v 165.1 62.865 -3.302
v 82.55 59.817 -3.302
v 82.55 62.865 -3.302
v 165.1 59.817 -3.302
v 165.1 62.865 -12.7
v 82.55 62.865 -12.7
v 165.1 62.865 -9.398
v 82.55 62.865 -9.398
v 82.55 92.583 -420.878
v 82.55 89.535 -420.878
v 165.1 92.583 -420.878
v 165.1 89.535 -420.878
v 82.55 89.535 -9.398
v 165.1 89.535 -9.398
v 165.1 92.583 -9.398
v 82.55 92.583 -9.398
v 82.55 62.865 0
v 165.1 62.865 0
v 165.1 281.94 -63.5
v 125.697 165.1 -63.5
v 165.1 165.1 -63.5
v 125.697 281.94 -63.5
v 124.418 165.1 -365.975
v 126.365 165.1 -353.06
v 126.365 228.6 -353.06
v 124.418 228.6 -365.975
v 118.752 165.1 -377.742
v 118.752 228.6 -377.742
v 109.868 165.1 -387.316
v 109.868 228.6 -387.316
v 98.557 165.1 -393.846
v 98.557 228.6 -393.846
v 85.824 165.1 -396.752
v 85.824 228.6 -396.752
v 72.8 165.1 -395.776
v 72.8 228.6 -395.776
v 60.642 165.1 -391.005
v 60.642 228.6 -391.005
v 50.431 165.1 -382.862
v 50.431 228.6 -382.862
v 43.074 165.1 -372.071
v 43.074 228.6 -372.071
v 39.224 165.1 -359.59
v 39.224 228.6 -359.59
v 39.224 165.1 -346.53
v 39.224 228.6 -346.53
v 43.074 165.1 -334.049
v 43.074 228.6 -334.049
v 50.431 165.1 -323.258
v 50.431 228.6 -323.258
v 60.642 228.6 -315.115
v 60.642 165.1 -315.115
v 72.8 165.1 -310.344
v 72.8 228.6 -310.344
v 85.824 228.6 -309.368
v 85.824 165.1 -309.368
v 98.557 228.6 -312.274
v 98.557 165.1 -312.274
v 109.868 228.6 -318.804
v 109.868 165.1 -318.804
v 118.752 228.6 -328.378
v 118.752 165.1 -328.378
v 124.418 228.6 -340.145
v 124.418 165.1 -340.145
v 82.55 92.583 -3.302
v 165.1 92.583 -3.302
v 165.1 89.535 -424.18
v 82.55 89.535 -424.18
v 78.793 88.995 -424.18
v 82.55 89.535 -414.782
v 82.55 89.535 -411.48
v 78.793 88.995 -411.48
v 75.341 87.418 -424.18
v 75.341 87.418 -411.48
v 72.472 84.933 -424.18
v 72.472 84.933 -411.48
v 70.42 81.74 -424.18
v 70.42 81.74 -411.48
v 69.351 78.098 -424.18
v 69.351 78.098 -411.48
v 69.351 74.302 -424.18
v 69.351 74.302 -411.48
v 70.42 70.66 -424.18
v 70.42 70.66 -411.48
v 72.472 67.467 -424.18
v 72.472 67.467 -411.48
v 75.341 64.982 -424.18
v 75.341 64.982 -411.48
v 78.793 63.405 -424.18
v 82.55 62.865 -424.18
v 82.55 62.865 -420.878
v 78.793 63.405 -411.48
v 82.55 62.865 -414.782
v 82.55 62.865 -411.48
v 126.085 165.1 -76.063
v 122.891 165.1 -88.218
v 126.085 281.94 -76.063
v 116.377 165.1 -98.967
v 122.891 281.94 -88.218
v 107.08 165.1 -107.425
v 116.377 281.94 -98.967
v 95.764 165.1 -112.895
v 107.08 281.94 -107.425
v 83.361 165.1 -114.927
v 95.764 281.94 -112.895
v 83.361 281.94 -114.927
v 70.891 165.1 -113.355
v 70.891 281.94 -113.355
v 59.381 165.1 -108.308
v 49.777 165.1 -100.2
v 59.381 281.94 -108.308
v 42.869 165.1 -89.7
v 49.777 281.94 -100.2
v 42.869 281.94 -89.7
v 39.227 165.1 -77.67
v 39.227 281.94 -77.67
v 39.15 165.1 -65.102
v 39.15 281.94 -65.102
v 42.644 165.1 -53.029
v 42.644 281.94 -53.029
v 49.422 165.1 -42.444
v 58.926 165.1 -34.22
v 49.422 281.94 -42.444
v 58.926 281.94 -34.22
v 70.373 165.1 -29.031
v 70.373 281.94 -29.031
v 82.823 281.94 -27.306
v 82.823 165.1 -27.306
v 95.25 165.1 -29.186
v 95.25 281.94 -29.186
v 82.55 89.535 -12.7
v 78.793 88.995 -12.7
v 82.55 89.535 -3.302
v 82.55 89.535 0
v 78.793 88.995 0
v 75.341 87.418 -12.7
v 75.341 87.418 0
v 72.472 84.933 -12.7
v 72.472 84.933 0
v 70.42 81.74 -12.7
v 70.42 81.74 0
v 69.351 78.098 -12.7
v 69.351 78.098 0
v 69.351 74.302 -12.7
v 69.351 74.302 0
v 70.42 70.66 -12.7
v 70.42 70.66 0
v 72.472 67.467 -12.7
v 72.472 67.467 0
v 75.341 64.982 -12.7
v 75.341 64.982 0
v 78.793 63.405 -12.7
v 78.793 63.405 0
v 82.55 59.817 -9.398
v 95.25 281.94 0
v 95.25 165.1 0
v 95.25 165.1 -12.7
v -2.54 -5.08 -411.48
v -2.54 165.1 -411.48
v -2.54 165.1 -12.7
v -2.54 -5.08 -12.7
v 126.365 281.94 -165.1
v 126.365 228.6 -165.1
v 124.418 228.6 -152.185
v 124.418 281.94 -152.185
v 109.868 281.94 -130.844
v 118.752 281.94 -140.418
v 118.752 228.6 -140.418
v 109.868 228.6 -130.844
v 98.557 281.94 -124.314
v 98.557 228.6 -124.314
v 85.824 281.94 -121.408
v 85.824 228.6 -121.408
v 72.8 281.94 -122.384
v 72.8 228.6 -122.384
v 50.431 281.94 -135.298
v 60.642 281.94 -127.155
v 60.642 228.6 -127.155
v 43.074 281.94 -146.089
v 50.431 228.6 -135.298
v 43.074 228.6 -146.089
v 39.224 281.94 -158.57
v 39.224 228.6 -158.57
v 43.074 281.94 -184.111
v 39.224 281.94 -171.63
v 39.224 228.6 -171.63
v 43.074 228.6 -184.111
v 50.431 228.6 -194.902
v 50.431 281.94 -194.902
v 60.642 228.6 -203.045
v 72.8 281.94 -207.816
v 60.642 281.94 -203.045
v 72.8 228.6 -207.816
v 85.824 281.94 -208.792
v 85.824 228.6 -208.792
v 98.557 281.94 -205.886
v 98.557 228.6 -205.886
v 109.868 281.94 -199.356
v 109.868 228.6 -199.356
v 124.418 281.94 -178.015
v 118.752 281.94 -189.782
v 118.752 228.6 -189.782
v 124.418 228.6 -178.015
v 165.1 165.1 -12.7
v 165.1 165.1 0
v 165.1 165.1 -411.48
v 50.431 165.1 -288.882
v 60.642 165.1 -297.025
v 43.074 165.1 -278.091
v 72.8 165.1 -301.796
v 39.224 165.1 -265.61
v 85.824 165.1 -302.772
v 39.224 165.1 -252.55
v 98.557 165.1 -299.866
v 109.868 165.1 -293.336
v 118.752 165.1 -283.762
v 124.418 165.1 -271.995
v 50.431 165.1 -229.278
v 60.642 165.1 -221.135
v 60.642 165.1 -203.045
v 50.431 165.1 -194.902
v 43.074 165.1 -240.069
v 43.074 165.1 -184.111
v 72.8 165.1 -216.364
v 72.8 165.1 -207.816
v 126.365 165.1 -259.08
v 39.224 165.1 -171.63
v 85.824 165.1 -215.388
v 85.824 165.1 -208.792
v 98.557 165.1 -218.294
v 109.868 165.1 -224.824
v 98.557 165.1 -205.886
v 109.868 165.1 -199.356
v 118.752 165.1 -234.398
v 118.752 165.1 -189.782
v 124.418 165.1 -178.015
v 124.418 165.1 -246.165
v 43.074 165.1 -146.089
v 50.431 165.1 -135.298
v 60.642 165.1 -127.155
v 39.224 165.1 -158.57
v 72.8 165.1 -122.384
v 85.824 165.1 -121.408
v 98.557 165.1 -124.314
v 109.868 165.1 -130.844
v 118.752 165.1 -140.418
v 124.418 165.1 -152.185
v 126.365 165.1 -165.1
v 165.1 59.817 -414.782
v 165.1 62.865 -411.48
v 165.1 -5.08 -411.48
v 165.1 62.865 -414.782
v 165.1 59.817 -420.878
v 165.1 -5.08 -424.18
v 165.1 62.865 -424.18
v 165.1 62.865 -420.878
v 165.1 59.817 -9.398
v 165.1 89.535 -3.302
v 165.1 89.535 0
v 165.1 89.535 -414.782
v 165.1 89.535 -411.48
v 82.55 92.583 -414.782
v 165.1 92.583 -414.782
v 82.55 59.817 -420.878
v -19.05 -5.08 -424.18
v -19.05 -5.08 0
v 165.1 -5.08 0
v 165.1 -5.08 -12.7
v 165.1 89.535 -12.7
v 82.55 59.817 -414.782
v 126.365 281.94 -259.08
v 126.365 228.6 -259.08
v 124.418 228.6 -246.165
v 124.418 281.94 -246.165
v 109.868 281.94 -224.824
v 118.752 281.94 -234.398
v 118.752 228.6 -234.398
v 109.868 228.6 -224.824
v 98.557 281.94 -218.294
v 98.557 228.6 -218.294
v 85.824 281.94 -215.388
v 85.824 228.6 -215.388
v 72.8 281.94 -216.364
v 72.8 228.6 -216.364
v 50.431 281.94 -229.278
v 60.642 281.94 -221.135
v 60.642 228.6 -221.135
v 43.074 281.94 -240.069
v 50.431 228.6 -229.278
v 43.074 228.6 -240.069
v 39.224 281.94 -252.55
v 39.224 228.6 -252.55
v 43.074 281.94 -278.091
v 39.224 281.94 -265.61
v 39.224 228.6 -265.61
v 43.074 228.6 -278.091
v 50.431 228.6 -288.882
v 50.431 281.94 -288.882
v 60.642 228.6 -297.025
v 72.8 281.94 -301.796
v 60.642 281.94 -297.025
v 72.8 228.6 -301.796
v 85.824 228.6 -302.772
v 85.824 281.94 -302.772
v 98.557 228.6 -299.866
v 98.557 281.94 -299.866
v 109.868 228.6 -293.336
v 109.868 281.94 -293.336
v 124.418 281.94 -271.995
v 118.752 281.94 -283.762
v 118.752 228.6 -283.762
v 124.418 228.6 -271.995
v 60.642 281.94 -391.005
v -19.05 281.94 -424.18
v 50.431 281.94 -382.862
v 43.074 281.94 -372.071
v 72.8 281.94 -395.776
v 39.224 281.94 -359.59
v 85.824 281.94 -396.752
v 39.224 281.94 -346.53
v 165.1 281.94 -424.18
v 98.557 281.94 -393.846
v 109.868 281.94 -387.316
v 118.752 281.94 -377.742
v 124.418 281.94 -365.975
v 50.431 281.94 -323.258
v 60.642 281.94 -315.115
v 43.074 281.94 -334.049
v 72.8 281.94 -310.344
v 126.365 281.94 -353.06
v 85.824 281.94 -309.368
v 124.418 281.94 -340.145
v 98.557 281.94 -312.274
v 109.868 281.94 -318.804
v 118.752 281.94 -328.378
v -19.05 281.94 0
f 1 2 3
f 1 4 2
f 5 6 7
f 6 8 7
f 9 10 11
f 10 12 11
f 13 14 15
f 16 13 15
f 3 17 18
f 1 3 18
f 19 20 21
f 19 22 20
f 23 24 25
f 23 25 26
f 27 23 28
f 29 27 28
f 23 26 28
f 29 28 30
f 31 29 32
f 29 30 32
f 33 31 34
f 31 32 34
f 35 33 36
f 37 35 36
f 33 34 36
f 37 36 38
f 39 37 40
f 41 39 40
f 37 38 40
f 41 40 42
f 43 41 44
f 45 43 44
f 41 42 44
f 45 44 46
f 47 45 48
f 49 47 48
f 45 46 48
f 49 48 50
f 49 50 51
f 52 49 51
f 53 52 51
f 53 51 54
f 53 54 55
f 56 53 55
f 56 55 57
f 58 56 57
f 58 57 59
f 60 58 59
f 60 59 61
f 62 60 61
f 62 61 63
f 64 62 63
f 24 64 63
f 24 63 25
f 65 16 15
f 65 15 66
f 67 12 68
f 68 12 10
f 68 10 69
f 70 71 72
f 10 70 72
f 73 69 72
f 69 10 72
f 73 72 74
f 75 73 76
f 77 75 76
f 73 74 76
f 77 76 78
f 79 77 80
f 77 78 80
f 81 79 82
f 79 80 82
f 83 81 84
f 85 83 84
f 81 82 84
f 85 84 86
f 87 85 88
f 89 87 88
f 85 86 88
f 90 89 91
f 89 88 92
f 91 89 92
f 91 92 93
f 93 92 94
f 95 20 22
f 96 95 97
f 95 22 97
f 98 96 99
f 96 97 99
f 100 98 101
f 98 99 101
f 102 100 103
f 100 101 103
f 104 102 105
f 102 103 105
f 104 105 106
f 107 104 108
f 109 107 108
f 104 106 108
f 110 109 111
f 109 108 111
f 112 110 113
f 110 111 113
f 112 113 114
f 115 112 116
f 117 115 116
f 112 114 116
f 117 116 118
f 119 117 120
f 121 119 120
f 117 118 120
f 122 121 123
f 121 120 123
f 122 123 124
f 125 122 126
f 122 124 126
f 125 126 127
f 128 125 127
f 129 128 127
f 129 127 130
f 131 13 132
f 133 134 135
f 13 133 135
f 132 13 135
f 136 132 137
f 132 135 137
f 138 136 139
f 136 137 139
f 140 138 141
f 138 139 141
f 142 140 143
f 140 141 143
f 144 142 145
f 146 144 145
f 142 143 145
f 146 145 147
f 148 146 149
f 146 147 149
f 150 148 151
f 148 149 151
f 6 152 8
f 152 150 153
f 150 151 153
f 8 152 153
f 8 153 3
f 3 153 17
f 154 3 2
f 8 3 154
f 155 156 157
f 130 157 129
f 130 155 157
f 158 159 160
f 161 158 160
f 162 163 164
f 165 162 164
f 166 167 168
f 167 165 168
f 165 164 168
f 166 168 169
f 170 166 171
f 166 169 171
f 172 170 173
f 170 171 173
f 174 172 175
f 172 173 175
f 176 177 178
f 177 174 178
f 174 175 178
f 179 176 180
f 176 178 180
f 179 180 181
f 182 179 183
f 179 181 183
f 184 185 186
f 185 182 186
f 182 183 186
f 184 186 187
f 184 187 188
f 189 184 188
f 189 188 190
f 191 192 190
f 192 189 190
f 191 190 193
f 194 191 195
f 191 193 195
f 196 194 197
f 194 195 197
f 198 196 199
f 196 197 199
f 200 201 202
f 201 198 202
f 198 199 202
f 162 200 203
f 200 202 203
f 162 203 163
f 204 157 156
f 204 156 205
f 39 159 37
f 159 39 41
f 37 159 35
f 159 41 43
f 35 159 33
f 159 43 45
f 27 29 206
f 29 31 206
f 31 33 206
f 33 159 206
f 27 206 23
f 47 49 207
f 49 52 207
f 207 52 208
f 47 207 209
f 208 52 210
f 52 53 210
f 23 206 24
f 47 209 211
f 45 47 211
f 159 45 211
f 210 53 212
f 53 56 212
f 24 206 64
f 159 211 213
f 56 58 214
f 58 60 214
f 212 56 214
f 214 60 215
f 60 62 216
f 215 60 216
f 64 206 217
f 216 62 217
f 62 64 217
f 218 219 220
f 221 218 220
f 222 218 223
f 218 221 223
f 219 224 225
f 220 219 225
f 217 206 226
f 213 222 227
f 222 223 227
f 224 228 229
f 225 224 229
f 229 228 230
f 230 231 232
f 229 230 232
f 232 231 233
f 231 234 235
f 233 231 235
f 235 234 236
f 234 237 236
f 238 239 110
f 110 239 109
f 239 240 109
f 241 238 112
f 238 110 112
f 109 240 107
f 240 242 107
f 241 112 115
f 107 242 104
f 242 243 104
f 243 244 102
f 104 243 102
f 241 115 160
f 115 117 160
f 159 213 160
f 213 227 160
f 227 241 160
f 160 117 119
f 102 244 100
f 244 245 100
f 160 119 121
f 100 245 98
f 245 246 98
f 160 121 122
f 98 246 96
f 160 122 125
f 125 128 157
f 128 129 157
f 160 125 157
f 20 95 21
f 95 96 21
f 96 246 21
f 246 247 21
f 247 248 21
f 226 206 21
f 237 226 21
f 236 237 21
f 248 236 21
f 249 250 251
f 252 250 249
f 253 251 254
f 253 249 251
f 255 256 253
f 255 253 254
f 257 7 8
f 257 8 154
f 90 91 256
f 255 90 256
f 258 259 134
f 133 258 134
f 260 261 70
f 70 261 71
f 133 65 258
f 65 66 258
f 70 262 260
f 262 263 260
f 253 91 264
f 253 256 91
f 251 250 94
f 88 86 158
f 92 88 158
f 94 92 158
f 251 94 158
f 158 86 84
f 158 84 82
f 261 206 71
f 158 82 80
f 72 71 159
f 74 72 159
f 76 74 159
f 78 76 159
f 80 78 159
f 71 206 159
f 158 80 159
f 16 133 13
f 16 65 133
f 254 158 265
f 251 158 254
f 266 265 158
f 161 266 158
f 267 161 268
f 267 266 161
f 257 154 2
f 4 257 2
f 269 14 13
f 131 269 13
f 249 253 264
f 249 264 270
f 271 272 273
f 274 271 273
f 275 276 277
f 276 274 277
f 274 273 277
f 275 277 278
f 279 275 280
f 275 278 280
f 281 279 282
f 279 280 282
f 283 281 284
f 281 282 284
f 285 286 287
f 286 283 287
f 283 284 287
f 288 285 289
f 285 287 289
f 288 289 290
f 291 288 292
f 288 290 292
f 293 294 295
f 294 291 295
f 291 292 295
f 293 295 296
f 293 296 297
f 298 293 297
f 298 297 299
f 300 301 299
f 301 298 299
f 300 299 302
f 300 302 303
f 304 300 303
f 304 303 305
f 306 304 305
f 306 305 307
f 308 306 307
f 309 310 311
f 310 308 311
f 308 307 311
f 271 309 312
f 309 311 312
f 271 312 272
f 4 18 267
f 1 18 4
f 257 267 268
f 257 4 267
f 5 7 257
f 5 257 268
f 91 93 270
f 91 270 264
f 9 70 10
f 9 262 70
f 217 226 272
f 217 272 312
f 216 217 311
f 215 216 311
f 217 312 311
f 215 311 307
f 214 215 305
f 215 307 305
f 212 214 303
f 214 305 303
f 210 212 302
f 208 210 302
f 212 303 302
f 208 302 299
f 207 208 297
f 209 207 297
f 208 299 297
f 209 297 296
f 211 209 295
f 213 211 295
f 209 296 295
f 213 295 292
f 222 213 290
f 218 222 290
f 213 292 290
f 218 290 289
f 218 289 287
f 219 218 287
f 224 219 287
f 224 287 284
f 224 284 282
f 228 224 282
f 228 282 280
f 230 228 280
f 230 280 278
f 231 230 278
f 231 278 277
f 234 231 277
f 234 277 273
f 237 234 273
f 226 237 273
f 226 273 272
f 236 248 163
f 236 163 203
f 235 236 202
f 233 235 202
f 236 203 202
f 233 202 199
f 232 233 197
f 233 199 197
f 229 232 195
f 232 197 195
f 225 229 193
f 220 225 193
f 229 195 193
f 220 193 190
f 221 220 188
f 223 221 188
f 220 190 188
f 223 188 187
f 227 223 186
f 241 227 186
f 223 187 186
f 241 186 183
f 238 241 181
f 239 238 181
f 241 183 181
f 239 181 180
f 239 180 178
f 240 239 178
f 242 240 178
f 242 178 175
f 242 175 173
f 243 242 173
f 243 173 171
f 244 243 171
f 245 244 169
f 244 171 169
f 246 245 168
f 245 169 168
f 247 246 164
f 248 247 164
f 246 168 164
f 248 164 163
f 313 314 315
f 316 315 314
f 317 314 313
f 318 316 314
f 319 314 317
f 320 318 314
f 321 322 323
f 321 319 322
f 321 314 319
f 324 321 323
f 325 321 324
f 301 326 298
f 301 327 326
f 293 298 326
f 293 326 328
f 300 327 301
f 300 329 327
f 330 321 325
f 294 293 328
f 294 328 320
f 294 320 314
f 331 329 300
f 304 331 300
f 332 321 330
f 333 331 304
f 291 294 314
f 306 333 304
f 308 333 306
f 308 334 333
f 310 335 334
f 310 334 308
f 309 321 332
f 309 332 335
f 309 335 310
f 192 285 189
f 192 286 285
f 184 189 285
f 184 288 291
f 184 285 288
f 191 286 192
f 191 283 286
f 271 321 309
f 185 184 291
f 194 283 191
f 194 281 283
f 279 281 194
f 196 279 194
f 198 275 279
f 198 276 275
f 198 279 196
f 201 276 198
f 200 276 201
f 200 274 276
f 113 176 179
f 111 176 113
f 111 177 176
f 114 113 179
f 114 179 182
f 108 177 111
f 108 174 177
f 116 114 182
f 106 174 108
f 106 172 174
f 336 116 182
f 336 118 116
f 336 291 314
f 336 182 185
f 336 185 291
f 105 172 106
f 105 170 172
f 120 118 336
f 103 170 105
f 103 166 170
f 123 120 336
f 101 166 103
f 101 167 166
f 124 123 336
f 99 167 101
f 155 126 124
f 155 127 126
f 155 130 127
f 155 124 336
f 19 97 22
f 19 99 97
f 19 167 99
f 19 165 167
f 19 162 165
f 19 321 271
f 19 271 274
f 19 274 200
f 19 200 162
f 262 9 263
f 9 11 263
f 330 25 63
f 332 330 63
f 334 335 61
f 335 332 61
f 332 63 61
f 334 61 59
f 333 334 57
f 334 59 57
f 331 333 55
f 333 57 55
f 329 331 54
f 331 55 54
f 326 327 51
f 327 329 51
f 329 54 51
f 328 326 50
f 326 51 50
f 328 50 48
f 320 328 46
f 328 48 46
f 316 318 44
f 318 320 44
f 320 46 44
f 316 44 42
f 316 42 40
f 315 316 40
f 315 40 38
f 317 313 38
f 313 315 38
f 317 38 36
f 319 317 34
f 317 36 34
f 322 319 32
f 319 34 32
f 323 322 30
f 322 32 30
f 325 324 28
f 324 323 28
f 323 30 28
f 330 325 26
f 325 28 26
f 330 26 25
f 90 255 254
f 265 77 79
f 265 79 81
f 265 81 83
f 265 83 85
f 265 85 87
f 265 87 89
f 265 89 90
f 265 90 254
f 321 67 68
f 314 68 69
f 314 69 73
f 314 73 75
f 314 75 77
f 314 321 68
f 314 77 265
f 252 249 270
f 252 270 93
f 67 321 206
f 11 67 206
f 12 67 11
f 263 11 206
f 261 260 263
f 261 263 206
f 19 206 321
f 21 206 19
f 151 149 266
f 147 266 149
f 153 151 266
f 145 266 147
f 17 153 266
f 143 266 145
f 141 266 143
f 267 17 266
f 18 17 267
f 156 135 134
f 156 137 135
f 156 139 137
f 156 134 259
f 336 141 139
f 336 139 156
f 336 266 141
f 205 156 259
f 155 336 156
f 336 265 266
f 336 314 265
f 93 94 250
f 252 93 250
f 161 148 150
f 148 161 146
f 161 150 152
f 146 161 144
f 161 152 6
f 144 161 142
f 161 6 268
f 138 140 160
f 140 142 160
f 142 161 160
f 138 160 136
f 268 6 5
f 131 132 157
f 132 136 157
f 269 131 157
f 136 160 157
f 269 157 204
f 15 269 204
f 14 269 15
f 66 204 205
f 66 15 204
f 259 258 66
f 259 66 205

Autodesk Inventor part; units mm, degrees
ref_plane "YZ Plane" through (0, 0, 0) normal (1, 0, 0) x (0, 1, 0)
ref_plane "XZ Plane" through (0, 0, 0) normal (0, 1, 0) x (-1, 0, 0)
sketch "Sketch1" plane through (0, 0, 0) normal (1, 0, 0) x (0, 1, 0)
  line L0 (0, 0) -> (228.6, 0)
  line L1 (228.6, 0) -> (228.6, -424.18)
  line L2 (228.6, -424.18) -> (0, -424.18)
  line L3 (0, -424.18) -> (0, 0)
  point P0 (0, 0)
  dimension "d0" = 424.18
  dimension "d1" = 228.6
extrude "Extrusion1" add sketch "Sketch1" along normal blind 165.1
sketch "Sketch2" plane through (165.1, 0, 0) normal (1, 0, 0) x (0, 0, -1)
  line L0 (0, 0) -> (424.18, 0) construction
  line L1 (12.7, 0) -> (411.48, 0)
  line L2 (411.48, 0) -> (411.48, 165.1)
  line L3 (411.48, 165.1) -> (12.7, 165.1)
  line L4 (12.7, 165.1) -> (12.7, 0)
  line L5 (0, 228.6) -> (0, 0) construction
  line L6 (424.18, 0) -> (424.18, 228.6) construction
  dimension "d4" = 398.78
  dimension "d5" = 165.1
  dimension "d6" = 12.7
  dimension "d7" = 12.7
extrude "Extrusion2" cut sketch "Sketch2" against normal blind 148.59
sketch "Sketch3" plane through (0, 0, 0) normal (0, 0, 1) x (1, 0, 0)
  line L0 (165.1, 228.6) -> (165.1, 0) projected
  line L1 (165.1, 89.535) -> (82.55, 89.535)
  line L2 (69.215, 89.535) -> (69.215, 62.865) construction
  line L3 (82.55, 62.865) -> (165.1, 62.865)
  line L4 (165.1, 62.865) -> (165.1, 89.535)
  line L5 (0, 0) -> (165.1, 0) projected
  arc A0 (82.55, 89.535) -> (82.55, 62.865) centre (82.55, 76.2) ccw
  dimension "d10" = 95.885
  dimension "d11" = 26.67
  dimension "d12" = 62.865
extrude "Extrusion3" cut sketch "Sketch3" against normal blind 457.2
sketch "Sketch4" plane through (0, 228.6, 0) normal (0, 1, 0) x (1, 0, 0)
  line L0 (165.1, 12.7) -> (165.1, 411.48) construction
  line L1 (165.1, 12.7) -> (16.51, 12.7) construction
  line L2 (16.51, 12.7) -> (16.51, 411.48) construction
  line L3 (165.1, 411.48) -> (16.51, 411.48) construction
  line L4 (0, 424.18) -> (165.1, 424.18) construction
  line L5 (0, 424.18) -> (165.1, 424.18) construction
  circle A0 centre (82.55, 353.06) radius 43.815
  line L6 (0, 0) -> (0, 424.18) construction
  circle A1 centre (82.55, 259.08) radius 43.815
  line L7 (0, 212.09) -> (165.1, 212.09) construction
  line L8 (165.1, 424.18) -> (165.1, 0) construction
  circle A2 centre (82.55, 71.12) radius 43.815
  circle A3 centre (82.55, 165.1) radius 43.815
  dimension "d15" = 87.63
  dimension "d16" = 82.55
  dimension "d17" = 58.42
  dimension "d18" = 87.63
  dimension "d19" = 93.98
  dimension "d20" = 82.55
extrude "Extrusion4" cut sketch "Sketch4" against normal blind 76.2
sketch "Sketch5" plane through (0, 228.6, 0) normal (0, 1, 0) x (1, 0, 0)
  circle A0 centre (82.55, 165.1) radius 43.815 projected
  circle A1 centre (82.55, 353.06) radius 43.815 projected
  circle A2 centre (82.55, 259.08) radius 43.815 projected
  circle A3 centre (82.55, 71.12) radius 43.815 projected
  line L0 (0, 0) -> (0, 424.18) projected
  line L1 (0, 0) -> (165.1, 0) projected
  line L2 (165.1, 424.18) -> (165.1, 0) projected
  line L3 (0, 424.18) -> (165.1, 424.18) projected
  point P0 (0, 0)
extrude "Extrusion5" add sketch "Sketch5" along normal blind 53.34
sketch "Sketch7" plane through (0, 0, 0) normal (-1, 0, 0) x (0, 0, 1)
  line L0 (0, 0) -> (0, 281.94) projected
  line L1 (-424.18, 281.94) -> (0, 281.94) projected
  line L2 (-424.18, 281.94) -> (-424.18, 0) projected
  line L3 (-424.18, 0) -> (0, 0) projected
  point P0 (0, 0)
extrude "Extrusion6" add sketch "Sketch7" along normal blind 19.05
sketch "Sketch8" plane through (16.51, 0, 0) normal (1, 0, 0) x (0, 0, -1)
  line L0 (411.48, 0) -> (12.7, 0) projected
  line L1 (411.48, 165.1) -> (411.48, 0) projected
  line L2 (12.7, 165.1) -> (411.48, 165.1) projected
  line L3 (12.7, 0) -> (12.7, 165.1) projected
  point P0 (0, 0)
extrude "Extrusion7" cut sketch "Sketch8" against normal blind 19.05
sketch "Sketch12" plane through (165.1, 0, 0) normal (1, 0, 0) x (0, 0, -1)
  line L0 (0, 89.535) -> (12.7, 89.535) construction
  line L1 (3.302, 89.535) -> (9.398, 89.535)
  line L2 (9.398, 89.535) -> (9.398, 92.583)
  line L3 (9.398, 92.583) -> (3.302, 92.583)
  line L4 (3.302, 92.583) -> (3.302, 89.535)
  line L5 (0, 89.535) -> (0, 281.94) construction
  line L6 (12.7, 89.535) -> (12.7, 62.865) construction
  line L7 (0, 89.535) -> (12.7, 89.535) construction
  line L8 (0, 62.865) -> (0, 89.535) construction
  line L9 (0, 62.865) -> (12.7, 62.865) construction
  line L10 (0, 62.865) -> (0, 89.535) construction
  line L11 (0, 76.2) -> (12.7, 76.2) construction
  line L12 (3.302, 62.865) -> (9.398, 62.865)
  line L13 (9.398, 62.865) -> (9.398, 59.817)
  line L14 (9.398, 59.817) -> (3.302, 59.817)
  line L15 (3.302, 59.817) -> (3.302, 62.865)
  point P0 (0, 0)
  dimension "d44" = 6.096
  dimension "d45" = 3.048
  dimension "d46" = 3.302
extrude "Extrusion11" cut sketch "Sketch12" against normal blind 82.55
sketch "Sketch13" plane through (-19.05, 0, 0) normal (0, -1, 0) x (1, 0, 0)
  line L0 (16.51, -12.7) -> (184.15, -12.7) projected
  line L1 (184.15, 0) -> (184.15, -12.7) projected
  line L2 (0, 0) -> (184.15, 0) projected
  line L3 (0, -424.18) -> (0, 0) projected
  line L4 (184.15, -424.18) -> (0, -424.18) projected
  line L5 (184.15, -411.48) -> (184.15, -424.18) projected
  line L6 (184.15, -411.48) -> (16.51, -411.48) projected
  line L7 (16.51, -411.48) -> (16.51, -12.7) projected
  point P0 (19.05, 0)
extrude "Extrusion12" add sketch "Sketch13" along normal blind 5.08
ref_plane "Work Plane1" through (82.55, 89.535, -212.09) normal (0, 0, 1) x (1, 0, 0)
mirror "Mirror1" about plane through (82.55, 89.535, -212.09) normal (0, 0, 1) of "Extrusion11"
sketch "Sketch21" plane through (0, 281.94, 0) normal (0, 1, 0) x (1, 0, 0)
  line L0 (165.1, 0) -> (95.25, 0)
  line L1 (95.25, 0) -> (95.25, 63.5)
  line L2 (95.25, 63.5) -> (165.1, 63.5)
  line L3 (165.1, 63.5) -> (165.1, 0)
  point P0 (0, 0)
  point P1 (165.1, 0)
  dimension "d70" = 63.5
  dimension "d71" = 69.85
extrude "Extrusion18" cut sketch "Sketch21" against normal blind 116.84
sketch "Sketch9" plane through (0, 281.94, 0) normal (0, 1, 0) x (1, 0, 0)
  line L0 (146.05, 19.05) -> (146.05, 405.13)
  line L1 (0, 405.13) -> (0, 19.05)
  line L2 (165.1, 424.18) -> (-19.05, 424.18) construction
  line L3 (-19.05, 0) -> (-19.05, 424.18) construction
  line L4 (165.1, 0) -> (165.1, 424.18) construction
  line L5 (165.1, 0) -> (-19.05, 0) construction
  circle A0 centre (82.55, 71.12) radius 43.815 construction
  circle A1 centre (82.55, 259.08) radius 43.815 construction
  circle A2 centre (82.55, 353.06) radius 43.815 construction
  circle A3 centre (82.55, 165.1) radius 43.815 construction
  line L6 (165.1, 0) -> (-19.05, 0) construction
  line L7 (165.1, 0) -> (165.1, 424.18) construction
  line L8 (165.1, 424.18) -> (-19.05, 424.18) construction
  line L9 (-19.05, 0) -> (-19.05, 424.18) construction
  line L10 (146.05, 405.13) -> (117.7739, 405.13)
  line L11 (47.3261, 405.13) -> (0, 405.13)
  arc A4 (47.3261, 405.13) -> (40.7894, 306.07) centre (82.55, 353.06) ccw
  arc A5 (124.3106, 306.07) -> (117.7739, 405.13) centre (82.55, 353.06) ccw
  arc A6 (40.7894, 306.07) -> (40.7894, 212.09) centre (82.55, 259.08) ccw
  arc A7 (124.3106, 212.09) -> (107.2668, 316.8822) centre (82.55, 259.08) ccw
  arc A8 (40.7894, 212.09) -> (40.7894, 118.11) centre (82.55, 165.1) ccw
  arc A9 (124.3106, 118.11) -> (124.3106, 212.09) centre (82.55, 165.1) ccw
  line L12 (0, 19.05) -> (47.3261, 19.05)
  line L13 (117.7739, 19.05) -> (146.05, 19.05)
  arc A10 (40.7894, 118.11) -> (47.3261, 19.05) centre (82.55, 71.12) ccw
  arc A11 (117.7739, 19.05) -> (124.3106, 118.11) centre (82.55, 71.12) ccw
  point P0 (0, 0)
  dimension "d30" = 19.05
  dimension "d31" = 19.05
sketch "Sketch10" plane through (0, 281.94, -19.05) normal (1, 0, 0) x (0, 0, -1)
  line L0 (405.13, 0) -> (405.13, -281.94) projected
  line L1 (-19.05, 0) -> (405.13, 0) projected
  line L2 (405.13, -101.6) -> (-19.05, -101.6)
  line L3 (-19.05, -101.6) -> (-19.05, 0)
  line L4 (-19.05, 0) -> (405.13, 0)
  line L5 (405.13, 0) -> (405.13, -101.6)
  line L6 (0, 0) -> (386.08, 0) projected
  line L7 (0, 0) -> (0, -101.6) projected
  line L8 (0, -101.6) -> (386.08, -101.6) projected
  line L9 (386.08, 0) -> (386.08, -101.6) projected
  point P0 (-19.05, -281.94)
  dimension "d39" = 0
sketch "Sketch11" plane through (0, 281.94, 0) normal (0, 1, 0) x (1, 0, 0)
  circle A0 centre (82.55, 71.12) radius 43.815 construction
  line L0 (19.05, 19.05) -> (19.05, 0) projected
  line L1 (19.05, 0) -> (47.3261, 0)
  line L2 (47.3261, 0) -> (47.3261, 19.05)
  line L3 (47.3261, 19.05) -> (19.05, 19.05)
  line L4 (19.05, 19.05) -> (19.05, 0)
  line L5 (165.1, 424.18) -> (19.05, 424.18) projected
  line L6 (47.3261, 405.13) -> (19.05, 405.13)
  line L7 (19.05, 405.13) -> (19.05, 424.18)
  line L8 (19.05, 424.18) -> (47.3261, 424.18)
  line L9 (47.3261, 424.18) -> (47.3261, 405.13)
  point P0 (0, 0)
properties part number "Engine Block"
